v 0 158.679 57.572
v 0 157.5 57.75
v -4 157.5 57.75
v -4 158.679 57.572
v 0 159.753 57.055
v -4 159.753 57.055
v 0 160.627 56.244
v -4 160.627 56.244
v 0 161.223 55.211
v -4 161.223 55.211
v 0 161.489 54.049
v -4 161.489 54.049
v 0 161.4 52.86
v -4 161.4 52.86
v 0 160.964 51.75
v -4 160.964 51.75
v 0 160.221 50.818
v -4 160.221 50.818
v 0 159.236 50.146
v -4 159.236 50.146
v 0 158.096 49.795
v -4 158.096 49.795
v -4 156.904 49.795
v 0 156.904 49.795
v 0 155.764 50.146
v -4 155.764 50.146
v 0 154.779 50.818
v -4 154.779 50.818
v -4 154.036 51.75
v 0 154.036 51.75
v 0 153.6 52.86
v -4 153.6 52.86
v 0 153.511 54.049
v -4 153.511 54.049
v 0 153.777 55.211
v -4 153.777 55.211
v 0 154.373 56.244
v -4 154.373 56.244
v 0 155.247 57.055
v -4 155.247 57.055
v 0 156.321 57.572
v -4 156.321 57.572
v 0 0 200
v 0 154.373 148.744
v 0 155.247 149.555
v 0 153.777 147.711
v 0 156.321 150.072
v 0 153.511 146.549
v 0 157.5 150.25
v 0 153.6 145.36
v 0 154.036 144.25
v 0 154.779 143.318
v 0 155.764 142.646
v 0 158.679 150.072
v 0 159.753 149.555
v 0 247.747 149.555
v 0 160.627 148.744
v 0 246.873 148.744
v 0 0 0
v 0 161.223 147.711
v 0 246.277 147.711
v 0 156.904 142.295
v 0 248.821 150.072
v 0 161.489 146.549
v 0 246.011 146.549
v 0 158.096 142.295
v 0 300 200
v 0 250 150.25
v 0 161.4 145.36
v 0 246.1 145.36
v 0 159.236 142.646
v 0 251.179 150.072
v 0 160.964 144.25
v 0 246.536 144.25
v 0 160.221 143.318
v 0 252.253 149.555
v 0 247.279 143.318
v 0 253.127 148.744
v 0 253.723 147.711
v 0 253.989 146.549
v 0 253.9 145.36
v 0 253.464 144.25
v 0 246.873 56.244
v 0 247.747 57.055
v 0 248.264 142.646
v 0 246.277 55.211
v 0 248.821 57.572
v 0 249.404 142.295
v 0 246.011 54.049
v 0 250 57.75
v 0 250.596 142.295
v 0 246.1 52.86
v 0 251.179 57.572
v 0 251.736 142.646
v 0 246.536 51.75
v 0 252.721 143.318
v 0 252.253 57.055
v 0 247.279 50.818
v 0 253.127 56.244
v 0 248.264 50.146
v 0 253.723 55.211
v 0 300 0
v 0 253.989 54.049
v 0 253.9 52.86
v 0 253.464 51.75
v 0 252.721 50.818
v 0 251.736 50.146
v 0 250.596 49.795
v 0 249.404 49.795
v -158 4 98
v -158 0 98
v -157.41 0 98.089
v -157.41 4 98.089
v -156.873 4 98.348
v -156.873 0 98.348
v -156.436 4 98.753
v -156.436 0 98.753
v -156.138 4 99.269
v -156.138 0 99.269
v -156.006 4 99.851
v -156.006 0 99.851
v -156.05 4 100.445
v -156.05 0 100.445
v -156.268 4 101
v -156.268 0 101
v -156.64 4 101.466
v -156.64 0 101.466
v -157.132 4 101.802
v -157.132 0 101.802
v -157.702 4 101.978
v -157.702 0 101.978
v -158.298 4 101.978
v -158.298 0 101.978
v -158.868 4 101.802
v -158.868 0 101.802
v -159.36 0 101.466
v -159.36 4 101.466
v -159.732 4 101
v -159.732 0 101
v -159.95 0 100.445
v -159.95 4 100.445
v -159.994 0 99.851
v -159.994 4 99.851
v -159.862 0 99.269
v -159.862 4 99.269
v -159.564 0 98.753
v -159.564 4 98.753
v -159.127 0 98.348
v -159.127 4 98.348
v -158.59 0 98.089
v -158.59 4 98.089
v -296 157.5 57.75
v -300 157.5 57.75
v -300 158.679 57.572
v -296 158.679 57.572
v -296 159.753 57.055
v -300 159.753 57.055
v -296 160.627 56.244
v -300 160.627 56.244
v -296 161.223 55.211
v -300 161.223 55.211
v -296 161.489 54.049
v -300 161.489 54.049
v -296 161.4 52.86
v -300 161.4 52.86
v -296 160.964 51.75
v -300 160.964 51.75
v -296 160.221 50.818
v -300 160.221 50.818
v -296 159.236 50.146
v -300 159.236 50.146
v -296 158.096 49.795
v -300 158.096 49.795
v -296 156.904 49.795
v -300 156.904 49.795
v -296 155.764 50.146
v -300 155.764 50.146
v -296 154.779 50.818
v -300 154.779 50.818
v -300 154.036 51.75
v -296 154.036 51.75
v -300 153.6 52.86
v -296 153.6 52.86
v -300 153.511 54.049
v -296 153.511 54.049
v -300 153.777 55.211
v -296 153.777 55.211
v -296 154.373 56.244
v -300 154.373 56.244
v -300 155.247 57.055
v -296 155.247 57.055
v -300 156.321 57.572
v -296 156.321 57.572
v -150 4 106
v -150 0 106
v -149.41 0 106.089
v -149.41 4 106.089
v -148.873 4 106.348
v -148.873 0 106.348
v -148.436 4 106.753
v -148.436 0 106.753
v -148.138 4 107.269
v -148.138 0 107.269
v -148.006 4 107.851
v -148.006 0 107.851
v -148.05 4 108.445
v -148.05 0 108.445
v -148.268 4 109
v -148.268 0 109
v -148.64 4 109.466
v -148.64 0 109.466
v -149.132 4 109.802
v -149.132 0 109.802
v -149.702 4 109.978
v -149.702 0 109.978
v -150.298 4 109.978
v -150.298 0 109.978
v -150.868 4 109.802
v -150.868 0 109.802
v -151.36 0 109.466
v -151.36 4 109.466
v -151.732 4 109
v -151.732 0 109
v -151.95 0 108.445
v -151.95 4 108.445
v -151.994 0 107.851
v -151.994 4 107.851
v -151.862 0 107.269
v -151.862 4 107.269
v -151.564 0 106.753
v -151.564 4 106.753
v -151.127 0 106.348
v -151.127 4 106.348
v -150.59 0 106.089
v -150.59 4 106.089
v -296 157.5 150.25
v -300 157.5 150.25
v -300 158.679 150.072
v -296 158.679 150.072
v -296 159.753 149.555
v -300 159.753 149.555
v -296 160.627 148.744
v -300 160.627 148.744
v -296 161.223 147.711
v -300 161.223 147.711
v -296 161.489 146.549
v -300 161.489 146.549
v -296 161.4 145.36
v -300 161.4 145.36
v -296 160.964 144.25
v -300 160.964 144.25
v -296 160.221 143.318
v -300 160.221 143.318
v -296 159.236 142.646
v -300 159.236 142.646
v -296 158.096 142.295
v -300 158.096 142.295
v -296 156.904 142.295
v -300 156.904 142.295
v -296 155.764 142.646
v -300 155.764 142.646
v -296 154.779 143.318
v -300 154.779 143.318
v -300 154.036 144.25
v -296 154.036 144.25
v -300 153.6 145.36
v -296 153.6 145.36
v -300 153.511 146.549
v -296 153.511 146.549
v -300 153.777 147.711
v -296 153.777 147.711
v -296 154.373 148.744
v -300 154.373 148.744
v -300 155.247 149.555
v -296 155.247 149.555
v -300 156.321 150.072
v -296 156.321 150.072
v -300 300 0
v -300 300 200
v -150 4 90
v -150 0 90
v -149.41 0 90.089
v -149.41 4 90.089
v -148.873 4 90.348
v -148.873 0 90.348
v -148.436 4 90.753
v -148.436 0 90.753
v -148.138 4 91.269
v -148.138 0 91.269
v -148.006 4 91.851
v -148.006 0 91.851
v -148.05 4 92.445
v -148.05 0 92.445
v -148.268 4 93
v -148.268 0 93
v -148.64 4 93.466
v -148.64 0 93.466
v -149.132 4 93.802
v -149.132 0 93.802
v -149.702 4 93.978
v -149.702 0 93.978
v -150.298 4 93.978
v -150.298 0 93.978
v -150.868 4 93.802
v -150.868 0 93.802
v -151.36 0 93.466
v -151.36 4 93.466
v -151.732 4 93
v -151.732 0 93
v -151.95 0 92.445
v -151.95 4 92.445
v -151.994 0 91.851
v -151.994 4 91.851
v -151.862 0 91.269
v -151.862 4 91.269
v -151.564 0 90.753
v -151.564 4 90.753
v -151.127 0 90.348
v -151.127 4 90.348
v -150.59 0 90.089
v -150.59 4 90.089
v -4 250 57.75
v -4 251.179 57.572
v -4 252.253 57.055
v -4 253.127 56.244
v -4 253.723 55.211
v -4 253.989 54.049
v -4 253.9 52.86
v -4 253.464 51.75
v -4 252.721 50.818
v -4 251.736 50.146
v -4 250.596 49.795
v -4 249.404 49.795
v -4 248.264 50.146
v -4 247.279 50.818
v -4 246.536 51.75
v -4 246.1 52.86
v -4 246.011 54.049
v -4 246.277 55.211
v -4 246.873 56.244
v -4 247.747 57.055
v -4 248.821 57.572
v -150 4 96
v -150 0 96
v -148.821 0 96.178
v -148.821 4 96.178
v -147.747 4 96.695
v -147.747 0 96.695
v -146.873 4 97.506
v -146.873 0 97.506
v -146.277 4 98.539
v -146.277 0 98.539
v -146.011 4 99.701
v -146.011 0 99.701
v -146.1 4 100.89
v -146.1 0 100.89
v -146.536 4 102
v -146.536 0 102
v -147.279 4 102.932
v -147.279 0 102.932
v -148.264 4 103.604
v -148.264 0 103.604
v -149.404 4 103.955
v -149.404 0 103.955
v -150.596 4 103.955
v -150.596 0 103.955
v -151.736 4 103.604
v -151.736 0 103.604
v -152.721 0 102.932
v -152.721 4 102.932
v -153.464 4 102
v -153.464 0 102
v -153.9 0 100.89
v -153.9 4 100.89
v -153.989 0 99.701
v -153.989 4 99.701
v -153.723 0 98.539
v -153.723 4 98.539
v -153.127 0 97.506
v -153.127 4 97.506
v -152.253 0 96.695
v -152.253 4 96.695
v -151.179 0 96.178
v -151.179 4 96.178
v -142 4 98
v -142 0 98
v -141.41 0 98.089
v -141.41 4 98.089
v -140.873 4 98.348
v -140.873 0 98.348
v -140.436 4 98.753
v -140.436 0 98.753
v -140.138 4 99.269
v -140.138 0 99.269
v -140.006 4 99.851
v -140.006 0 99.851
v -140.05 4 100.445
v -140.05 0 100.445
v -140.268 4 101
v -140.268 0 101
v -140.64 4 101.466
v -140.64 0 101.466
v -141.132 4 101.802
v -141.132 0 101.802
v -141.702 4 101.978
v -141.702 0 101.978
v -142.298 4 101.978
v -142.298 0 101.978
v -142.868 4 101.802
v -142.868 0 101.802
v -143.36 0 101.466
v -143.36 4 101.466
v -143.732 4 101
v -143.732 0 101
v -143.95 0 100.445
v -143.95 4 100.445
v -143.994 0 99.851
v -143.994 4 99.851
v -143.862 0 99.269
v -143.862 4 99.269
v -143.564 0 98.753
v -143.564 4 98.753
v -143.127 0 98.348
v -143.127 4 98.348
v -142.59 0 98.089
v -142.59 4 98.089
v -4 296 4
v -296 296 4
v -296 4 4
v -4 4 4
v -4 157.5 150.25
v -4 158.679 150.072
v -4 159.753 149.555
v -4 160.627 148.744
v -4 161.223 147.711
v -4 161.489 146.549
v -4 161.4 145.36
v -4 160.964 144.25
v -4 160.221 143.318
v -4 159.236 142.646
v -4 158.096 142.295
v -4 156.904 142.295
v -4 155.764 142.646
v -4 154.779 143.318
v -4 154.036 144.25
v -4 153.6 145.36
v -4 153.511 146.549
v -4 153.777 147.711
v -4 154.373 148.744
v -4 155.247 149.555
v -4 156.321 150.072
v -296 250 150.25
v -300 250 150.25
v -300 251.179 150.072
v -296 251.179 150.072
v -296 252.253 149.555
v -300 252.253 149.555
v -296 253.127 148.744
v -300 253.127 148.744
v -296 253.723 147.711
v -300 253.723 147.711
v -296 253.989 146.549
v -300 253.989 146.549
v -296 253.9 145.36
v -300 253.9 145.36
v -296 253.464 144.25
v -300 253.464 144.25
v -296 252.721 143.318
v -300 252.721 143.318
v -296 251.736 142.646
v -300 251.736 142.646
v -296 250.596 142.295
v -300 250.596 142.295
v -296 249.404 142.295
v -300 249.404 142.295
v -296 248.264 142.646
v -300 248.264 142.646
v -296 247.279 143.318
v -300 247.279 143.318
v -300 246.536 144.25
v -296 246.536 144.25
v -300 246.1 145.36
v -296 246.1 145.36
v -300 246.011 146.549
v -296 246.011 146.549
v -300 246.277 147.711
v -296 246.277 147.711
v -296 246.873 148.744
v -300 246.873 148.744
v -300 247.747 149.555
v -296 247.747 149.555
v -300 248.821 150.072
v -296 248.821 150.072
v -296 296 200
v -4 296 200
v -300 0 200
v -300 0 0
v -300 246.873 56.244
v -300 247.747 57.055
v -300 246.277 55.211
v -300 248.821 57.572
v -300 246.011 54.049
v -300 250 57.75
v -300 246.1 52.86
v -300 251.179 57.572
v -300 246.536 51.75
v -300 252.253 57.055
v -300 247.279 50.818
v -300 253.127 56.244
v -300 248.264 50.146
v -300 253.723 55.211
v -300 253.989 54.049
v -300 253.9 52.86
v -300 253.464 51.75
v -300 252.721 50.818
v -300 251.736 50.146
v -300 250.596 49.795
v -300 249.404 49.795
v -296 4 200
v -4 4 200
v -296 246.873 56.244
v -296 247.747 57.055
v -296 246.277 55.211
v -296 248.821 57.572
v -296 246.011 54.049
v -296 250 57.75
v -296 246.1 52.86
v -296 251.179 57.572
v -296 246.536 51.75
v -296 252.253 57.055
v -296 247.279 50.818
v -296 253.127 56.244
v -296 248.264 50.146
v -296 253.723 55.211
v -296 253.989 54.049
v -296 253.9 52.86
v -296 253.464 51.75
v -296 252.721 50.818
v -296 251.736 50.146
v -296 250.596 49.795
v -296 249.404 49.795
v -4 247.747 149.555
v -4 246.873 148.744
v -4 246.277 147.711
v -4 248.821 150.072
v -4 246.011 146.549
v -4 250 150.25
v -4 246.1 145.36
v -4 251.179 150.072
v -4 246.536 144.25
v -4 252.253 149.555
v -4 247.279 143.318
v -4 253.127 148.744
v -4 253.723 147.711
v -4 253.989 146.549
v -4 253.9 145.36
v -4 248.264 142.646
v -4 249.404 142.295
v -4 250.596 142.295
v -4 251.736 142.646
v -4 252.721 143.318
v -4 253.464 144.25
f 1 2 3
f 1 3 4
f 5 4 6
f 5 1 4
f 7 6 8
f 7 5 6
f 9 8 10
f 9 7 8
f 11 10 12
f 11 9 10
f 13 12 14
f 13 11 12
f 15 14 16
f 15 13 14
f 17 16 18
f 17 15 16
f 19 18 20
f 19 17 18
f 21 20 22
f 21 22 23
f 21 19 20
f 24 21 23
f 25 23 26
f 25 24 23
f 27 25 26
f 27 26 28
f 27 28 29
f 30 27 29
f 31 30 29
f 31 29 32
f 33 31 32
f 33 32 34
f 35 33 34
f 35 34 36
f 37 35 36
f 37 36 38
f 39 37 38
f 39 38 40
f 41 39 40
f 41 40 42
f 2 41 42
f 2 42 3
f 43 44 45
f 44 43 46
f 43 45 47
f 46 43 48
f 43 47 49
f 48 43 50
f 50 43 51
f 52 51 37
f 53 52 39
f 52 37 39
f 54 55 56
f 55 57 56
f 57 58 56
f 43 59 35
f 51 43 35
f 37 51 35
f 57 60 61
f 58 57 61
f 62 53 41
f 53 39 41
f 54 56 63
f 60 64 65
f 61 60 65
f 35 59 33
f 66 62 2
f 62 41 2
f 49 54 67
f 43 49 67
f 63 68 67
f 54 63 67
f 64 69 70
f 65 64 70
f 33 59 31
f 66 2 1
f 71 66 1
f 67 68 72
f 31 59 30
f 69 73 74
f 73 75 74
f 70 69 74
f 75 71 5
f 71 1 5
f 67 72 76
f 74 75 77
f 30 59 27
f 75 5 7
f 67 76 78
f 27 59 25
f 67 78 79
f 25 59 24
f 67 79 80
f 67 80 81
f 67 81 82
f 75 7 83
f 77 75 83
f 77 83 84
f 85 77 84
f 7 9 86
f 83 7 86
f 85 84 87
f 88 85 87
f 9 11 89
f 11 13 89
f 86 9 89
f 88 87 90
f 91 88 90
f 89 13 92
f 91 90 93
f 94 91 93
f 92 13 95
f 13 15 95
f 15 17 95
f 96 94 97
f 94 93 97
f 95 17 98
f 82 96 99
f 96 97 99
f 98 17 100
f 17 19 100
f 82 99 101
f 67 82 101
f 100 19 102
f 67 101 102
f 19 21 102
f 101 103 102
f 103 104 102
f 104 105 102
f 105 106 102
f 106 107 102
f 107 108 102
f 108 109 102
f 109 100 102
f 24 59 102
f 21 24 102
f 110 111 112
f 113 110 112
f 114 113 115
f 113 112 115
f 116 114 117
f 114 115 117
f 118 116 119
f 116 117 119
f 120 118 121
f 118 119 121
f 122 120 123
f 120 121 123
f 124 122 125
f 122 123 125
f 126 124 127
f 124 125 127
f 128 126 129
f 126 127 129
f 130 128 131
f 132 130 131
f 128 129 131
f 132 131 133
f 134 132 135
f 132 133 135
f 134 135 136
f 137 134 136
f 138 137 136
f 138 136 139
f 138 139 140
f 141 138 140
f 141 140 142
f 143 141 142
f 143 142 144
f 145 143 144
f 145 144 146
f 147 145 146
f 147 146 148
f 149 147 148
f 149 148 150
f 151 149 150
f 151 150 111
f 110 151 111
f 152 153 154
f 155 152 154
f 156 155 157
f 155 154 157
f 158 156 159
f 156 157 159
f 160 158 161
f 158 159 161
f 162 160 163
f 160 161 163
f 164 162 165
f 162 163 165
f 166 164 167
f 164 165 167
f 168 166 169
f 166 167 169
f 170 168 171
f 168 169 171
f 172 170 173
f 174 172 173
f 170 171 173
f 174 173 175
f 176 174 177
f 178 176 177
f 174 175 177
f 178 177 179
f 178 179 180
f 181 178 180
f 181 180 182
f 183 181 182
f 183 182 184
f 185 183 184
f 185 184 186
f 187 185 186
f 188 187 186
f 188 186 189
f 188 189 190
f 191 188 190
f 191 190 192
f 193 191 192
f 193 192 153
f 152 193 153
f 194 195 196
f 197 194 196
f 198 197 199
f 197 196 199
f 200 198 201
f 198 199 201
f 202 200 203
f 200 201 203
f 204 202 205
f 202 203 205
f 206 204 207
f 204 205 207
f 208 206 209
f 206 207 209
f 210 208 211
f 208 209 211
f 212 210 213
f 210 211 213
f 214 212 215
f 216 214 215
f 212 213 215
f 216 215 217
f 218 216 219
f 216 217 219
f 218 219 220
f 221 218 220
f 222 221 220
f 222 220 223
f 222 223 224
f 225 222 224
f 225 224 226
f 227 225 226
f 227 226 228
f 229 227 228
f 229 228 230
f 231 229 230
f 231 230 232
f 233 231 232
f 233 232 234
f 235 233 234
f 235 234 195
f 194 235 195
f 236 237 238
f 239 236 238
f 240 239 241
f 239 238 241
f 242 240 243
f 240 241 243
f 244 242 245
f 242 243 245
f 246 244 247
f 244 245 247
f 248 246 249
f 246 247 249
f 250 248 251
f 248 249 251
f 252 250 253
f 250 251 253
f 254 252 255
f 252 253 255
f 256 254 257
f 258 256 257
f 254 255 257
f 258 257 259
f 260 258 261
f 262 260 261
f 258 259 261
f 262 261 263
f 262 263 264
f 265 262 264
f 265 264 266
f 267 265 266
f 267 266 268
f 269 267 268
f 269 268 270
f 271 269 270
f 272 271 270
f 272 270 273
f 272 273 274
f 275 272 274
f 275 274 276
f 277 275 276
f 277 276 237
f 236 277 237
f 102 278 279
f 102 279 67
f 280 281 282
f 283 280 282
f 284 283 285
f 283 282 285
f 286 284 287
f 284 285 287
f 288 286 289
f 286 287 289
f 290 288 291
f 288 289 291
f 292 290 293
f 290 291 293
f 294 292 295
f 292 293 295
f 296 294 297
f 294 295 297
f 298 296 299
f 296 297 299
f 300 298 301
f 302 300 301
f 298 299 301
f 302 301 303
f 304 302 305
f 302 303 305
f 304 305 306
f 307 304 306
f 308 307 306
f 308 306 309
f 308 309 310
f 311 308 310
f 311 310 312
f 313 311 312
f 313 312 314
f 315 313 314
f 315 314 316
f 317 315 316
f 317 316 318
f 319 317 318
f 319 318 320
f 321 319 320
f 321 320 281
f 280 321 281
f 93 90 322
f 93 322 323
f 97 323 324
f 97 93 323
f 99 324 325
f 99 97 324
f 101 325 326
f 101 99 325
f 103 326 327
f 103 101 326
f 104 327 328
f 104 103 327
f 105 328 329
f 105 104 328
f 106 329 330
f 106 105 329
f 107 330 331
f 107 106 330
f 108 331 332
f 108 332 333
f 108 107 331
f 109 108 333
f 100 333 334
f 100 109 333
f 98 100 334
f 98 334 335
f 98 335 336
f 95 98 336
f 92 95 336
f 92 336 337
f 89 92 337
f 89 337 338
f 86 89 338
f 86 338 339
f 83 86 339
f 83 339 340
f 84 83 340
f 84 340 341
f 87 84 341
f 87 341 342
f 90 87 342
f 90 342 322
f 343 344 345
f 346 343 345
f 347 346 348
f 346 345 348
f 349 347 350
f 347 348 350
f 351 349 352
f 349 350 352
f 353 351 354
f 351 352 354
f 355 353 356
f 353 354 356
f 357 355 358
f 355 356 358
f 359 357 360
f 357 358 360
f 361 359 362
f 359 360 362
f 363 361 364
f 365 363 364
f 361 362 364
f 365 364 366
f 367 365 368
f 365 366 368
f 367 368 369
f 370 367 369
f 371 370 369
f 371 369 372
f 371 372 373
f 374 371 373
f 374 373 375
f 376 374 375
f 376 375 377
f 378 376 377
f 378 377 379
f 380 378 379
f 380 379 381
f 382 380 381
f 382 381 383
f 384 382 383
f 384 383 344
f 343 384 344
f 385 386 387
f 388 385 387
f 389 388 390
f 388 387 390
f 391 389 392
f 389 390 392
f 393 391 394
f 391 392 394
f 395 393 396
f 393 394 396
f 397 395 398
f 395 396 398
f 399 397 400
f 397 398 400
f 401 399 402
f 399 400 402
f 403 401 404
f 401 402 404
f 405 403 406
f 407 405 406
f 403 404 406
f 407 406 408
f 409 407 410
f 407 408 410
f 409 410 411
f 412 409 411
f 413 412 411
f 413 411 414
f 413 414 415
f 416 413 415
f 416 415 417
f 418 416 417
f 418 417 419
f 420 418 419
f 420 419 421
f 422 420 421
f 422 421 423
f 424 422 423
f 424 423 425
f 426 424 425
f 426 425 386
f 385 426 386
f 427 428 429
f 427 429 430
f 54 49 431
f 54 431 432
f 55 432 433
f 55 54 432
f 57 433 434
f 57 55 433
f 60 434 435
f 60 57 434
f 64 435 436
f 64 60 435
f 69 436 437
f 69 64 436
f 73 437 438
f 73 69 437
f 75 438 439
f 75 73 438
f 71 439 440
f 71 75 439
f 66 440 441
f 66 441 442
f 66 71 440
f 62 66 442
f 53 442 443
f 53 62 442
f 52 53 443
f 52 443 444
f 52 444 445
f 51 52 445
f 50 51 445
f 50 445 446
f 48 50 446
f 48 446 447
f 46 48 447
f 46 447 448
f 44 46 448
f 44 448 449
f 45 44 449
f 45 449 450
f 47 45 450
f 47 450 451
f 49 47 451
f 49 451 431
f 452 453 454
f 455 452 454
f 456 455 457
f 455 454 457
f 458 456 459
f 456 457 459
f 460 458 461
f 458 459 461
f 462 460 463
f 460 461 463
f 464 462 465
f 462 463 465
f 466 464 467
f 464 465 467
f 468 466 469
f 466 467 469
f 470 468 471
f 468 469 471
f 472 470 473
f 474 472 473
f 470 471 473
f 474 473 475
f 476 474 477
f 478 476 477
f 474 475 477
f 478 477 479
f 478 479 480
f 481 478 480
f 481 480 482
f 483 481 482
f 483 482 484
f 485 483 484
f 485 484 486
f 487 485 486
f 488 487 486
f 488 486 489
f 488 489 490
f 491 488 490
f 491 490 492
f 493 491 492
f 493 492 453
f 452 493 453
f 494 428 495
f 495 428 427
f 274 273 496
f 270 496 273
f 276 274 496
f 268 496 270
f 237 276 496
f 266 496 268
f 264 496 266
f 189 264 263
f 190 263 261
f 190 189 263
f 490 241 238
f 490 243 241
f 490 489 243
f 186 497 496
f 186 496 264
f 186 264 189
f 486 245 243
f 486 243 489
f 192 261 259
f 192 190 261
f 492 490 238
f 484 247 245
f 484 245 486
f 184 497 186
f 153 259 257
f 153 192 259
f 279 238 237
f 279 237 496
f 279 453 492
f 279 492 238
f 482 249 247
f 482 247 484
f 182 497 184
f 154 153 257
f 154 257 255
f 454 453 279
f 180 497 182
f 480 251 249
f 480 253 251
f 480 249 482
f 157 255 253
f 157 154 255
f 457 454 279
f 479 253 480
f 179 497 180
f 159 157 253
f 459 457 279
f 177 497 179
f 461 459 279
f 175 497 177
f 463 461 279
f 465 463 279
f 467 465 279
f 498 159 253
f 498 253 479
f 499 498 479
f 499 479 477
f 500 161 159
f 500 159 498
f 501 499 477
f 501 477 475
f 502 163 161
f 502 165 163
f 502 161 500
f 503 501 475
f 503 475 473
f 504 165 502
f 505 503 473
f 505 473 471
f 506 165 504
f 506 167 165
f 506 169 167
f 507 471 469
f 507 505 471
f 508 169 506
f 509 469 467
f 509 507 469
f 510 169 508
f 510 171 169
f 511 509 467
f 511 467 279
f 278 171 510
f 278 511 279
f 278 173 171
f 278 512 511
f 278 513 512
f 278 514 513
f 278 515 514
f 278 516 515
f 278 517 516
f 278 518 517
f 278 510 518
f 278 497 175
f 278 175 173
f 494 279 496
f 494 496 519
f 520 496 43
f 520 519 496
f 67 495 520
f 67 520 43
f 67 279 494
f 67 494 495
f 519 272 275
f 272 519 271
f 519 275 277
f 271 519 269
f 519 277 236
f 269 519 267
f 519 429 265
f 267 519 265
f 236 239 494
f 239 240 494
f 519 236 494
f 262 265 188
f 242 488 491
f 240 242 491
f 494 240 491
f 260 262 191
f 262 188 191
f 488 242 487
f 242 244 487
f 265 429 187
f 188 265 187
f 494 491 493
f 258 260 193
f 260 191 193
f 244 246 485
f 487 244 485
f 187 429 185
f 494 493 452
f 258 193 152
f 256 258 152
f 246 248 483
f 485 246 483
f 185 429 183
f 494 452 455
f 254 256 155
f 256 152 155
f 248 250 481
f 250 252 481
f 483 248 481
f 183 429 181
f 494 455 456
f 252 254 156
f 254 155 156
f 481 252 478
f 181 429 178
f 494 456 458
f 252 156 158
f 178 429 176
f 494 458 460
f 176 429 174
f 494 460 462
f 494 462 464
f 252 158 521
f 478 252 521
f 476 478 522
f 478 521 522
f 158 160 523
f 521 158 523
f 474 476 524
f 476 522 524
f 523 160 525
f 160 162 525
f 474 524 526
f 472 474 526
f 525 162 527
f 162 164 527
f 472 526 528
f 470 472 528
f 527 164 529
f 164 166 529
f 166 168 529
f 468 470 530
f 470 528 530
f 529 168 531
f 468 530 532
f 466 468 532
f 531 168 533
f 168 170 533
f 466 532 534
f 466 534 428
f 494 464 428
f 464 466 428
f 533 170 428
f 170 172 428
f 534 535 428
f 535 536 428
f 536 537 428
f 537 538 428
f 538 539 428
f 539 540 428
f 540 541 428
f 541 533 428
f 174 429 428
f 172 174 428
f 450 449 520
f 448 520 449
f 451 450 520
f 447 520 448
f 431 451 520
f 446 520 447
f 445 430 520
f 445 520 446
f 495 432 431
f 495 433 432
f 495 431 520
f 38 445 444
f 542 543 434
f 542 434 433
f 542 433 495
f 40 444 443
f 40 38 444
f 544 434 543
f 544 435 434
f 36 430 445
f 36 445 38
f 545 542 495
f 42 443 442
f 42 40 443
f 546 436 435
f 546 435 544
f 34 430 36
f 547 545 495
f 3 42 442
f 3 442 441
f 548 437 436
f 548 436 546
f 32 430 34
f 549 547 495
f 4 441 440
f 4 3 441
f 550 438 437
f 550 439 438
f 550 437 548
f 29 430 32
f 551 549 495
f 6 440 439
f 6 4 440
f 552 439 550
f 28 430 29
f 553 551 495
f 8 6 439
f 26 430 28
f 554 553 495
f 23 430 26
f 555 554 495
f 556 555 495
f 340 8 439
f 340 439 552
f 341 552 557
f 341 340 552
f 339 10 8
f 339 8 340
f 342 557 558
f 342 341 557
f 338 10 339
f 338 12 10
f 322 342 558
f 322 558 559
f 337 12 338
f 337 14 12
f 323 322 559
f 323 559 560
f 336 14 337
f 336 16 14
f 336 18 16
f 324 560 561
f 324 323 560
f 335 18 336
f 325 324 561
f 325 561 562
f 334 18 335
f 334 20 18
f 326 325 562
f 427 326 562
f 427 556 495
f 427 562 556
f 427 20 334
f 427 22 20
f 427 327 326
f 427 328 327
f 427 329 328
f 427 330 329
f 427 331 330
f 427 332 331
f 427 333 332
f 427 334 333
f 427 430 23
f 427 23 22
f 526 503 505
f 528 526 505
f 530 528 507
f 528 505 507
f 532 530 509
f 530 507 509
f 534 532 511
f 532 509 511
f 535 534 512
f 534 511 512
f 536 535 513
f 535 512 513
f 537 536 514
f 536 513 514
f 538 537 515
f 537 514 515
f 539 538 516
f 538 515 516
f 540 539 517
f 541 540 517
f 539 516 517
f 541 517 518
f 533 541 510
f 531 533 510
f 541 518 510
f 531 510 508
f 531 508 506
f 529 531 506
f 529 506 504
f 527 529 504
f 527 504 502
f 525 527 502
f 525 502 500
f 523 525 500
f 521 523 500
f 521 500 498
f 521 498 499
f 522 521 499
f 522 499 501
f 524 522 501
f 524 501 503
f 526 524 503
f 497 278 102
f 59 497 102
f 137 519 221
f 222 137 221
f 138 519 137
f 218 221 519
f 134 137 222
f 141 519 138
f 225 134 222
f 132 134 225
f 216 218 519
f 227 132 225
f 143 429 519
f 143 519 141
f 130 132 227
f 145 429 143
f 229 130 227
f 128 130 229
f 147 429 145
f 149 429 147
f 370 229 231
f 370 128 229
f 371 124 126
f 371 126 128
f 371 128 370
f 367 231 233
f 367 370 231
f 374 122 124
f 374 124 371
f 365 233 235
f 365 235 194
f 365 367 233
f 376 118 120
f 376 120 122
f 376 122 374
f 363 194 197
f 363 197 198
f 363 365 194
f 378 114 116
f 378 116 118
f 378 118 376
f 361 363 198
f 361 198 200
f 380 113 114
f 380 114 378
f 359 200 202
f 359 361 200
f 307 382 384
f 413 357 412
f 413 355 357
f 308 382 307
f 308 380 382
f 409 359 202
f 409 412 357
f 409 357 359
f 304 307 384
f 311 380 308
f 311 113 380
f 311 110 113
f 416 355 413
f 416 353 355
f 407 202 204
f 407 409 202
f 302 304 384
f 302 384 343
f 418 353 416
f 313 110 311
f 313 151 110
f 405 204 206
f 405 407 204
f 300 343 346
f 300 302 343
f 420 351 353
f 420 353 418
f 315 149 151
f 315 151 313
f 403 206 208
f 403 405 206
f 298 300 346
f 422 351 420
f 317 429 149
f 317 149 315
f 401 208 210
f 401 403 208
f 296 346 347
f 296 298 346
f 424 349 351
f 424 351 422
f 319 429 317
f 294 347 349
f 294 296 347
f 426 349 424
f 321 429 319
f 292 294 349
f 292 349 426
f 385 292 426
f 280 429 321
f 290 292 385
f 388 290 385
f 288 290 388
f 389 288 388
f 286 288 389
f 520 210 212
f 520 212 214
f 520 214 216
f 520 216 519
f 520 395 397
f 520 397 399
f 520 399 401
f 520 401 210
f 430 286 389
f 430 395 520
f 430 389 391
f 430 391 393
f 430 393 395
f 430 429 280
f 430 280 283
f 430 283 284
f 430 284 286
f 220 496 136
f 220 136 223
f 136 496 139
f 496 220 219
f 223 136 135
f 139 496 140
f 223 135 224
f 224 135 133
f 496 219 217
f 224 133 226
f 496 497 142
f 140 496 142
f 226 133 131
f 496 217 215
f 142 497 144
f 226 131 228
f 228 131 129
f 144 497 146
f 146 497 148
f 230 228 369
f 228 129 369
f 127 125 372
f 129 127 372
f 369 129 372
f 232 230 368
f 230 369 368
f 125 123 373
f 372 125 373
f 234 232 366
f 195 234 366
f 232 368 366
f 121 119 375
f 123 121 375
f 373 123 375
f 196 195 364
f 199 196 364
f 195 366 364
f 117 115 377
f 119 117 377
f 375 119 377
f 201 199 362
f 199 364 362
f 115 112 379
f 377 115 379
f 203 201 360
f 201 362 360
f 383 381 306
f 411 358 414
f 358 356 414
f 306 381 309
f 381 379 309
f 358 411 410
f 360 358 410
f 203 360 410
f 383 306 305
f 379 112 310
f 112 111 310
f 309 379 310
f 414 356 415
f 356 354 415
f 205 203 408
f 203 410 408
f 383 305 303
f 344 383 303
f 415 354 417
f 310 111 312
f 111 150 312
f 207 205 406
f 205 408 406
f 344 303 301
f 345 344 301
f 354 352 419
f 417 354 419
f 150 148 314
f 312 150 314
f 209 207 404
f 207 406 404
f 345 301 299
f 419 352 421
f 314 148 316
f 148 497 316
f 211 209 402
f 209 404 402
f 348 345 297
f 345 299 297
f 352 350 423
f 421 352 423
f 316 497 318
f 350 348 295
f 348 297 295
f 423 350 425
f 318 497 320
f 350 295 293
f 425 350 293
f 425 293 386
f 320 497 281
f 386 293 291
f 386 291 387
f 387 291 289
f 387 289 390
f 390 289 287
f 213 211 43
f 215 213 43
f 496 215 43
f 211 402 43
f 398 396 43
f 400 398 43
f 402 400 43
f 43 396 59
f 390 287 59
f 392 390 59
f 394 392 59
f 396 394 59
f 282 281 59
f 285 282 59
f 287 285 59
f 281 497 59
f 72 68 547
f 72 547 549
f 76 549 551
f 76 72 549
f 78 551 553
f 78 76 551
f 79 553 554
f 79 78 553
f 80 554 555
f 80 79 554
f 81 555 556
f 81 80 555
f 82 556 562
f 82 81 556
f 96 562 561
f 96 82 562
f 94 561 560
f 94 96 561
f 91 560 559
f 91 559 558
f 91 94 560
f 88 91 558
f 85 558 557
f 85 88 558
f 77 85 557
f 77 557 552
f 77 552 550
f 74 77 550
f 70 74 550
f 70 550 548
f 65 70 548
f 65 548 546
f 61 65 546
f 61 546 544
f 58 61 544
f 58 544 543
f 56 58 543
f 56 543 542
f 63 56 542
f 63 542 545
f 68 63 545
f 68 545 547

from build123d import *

# Parameters (mm, degrees)
IZIM1_W                     = 300
IZIM1_H                     = 300
Y_KSEKLIK_EKSTR_ZYON1_DEPTH = 200
BO_ALTMA1_T                 = -4
KES_EKSTR_ZYON1_REACH       = 471.042
IZIM2_R                     = 4
KES_EKSTR_ZYON2_REACH       = 471.042
IZIM3_R                     = 4
IZIM3_R_2                   = 2


with BuildPart() as part:
    # Çizim1 → Yükseklik-Ekstrüzyon1 (new body)
    with BuildSketch(Plane.XY):
        with Locations((-150, 150)):
            Rectangle(IZIM1_W, IZIM1_H)
    extrude(amount=Y_KSEKLIK_EKSTR_ZYON1_DEPTH)

    # İç Boşaltma1
    bo_altma1_openings = [part.faces().sort_by_distance(p)[0] for p in [
        (-150, 150, 200),
    ]]
    offset(amount=BO_ALTMA1_T, openings=bo_altma1_openings, kind=Kind.INTERSECTION)

    # Çizim2 → Kes-Ekstrüzyon1 (cut, up to next)
    with BuildSketch(Plane.ZY.offset(300), mode=Mode.PRIVATE) as kes_ekstr_zyon1_sk1:
        with Locations((146.25, 250)):
            Circle(IZIM2_R)
    kes_ekstr_zyon1_tool1 = extrude(kes_ekstr_zyon1_sk1.sketch, amount=-KES_EKSTR_ZYON1_REACH, mode=Mode.PRIVATE) & part.part
    # Çizim2 → Kes-Ekstrüzyon1 (cut, up to next)
    with BuildSketch(Plane.ZY.offset(300), mode=Mode.PRIVATE) as kes_ekstr_zyon1_sk2:
        with Locations((53.75, 250)):
            Circle(IZIM2_R)
    kes_ekstr_zyon1_tool2 = extrude(kes_ekstr_zyon1_sk2.sketch, amount=-KES_EKSTR_ZYON1_REACH, mode=Mode.PRIVATE) & part.part
    # Çizim2 → Kes-Ekstrüzyon1 (cut, up to next)
    with BuildSketch(Plane.ZY.offset(300), mode=Mode.PRIVATE) as kes_ekstr_zyon1_sk3:
        with Locations((146.25, 157.5)):
            Circle(IZIM2_R)
    kes_ekstr_zyon1_tool3 = extrude(kes_ekstr_zyon1_sk3.sketch, amount=-KES_EKSTR_ZYON1_REACH, mode=Mode.PRIVATE) & part.part
    # Çizim2 → Kes-Ekstrüzyon1 (cut, up to next)
    with BuildSketch(Plane.ZY.offset(300), mode=Mode.PRIVATE) as kes_ekstr_zyon1_sk4:
        with Locations((53.75, 157.5)):
            Circle(IZIM2_R)
    kes_ekstr_zyon1_tool4 = extrude(kes_ekstr_zyon1_sk4.sketch, amount=-KES_EKSTR_ZYON1_REACH, mode=Mode.PRIVATE) & part.part
    kes_ekstr_zyon1_1 = kes_ekstr_zyon1_tool1.solids().sort_by_distance((-300, 250, 146.25))[0]
    add(kes_ekstr_zyon1_1, mode=Mode.SUBTRACT)
    kes_ekstr_zyon1_2 = kes_ekstr_zyon1_tool2.solids().sort_by_distance((-300, 250, 53.75))[0]
    add(kes_ekstr_zyon1_2, mode=Mode.SUBTRACT)
    kes_ekstr_zyon1_3 = kes_ekstr_zyon1_tool3.solids().sort_by_distance((-300, 157.5, 146.25))[0]
    add(kes_ekstr_zyon1_3, mode=Mode.SUBTRACT)
    kes_ekstr_zyon1_4 = kes_ekstr_zyon1_tool4.solids().sort_by_distance((-300, 157.5, 53.75))[0]
    add(kes_ekstr_zyon1_4, mode=Mode.SUBTRACT)
    kes_ekstr_zyon1 = kes_ekstr_zyon1_1 + kes_ekstr_zyon1_2 + kes_ekstr_zyon1_3 + kes_ekstr_zyon1_4  # Kes-Ekstrüzyon1 as one shape, for the pattern or mirror that repeats it

    # Aynalama1: Kes-Ekstrüzyon1 across plane
    add(kes_ekstr_zyon1.mirror(Plane(origin=(-150, 0, 0), x_dir=(0, 0, 1), z_dir=(1, 0, 0))), mode=Mode.SUBTRACT)

    # Çizim3 → Kes-Ekstrüzyon2 (cut, up to next)
    with BuildSketch(Plane.XZ, mode=Mode.PRIVATE) as kes_ekstr_zyon2_sk1:
        with Locations(Location((-150, 100, 0), (0, 0, 270))):
            Circle(IZIM3_R)
    kes_ekstr_zyon2_tool1 = extrude(kes_ekstr_zyon2_sk1.sketch, amount=-KES_EKSTR_ZYON2_REACH, mode=Mode.PRIVATE) & part.part
    # Çizim3 → Kes-Ekstrüzyon2 (cut, up to next)
    with BuildSketch(Plane.XZ, mode=Mode.PRIVATE) as kes_ekstr_zyon2_sk2:
        with Locations(Location((-150, 108, 0), (0, 0, 270))):
            Circle(IZIM3_R_2)
    kes_ekstr_zyon2_tool2 = extrude(kes_ekstr_zyon2_sk2.sketch, amount=-KES_EKSTR_ZYON2_REACH, mode=Mode.PRIVATE) & part.part
    # Çizim3 → Kes-Ekstrüzyon2 (cut, up to next)
    with BuildSketch(Plane.XZ, mode=Mode.PRIVATE) as kes_ekstr_zyon2_sk3:
        with Locations(Location((-158, 100, 0), (0, 0, 270))):
            Circle(IZIM3_R_2)
    kes_ekstr_zyon2_tool3 = extrude(kes_ekstr_zyon2_sk3.sketch, amount=-KES_EKSTR_ZYON2_REACH, mode=Mode.PRIVATE) & part.part
    # Çizim3 → Kes-Ekstrüzyon2 (cut, up to next)
    with BuildSketch(Plane.XZ, mode=Mode.PRIVATE) as kes_ekstr_zyon2_sk4:
        with Locations(Location((-150, 92, 0), (0, 0, 270))):
            Circle(IZIM3_R_2)
    kes_ekstr_zyon2_tool4 = extrude(kes_ekstr_zyon2_sk4.sketch, amount=-KES_EKSTR_ZYON2_REACH, mode=Mode.PRIVATE) & part.part
    # Çizim3 → Kes-Ekstrüzyon2 (cut, up to next)
    with BuildSketch(Plane.XZ, mode=Mode.PRIVATE) as kes_ekstr_zyon2_sk5:
        with Locations(Location((-142, 100, 0), (0, 0, 270))):
            Circle(IZIM3_R_2)
    kes_ekstr_zyon2_tool5 = extrude(kes_ekstr_zyon2_sk5.sketch, amount=-KES_EKSTR_ZYON2_REACH, mode=Mode.PRIVATE) & part.part
    add(kes_ekstr_zyon2_tool1.solids().sort_by_distance((-150, 0, 100))[0], mode=Mode.SUBTRACT)
    add(kes_ekstr_zyon2_tool2.solids().sort_by_distance((-150, 0, 108))[0], mode=Mode.SUBTRACT)
    add(kes_ekstr_zyon2_tool3.solids().sort_by_distance((-158, 0, 100))[0], mode=Mode.SUBTRACT)
    add(kes_ekstr_zyon2_tool4.solids().sort_by_distance((-150, 0, 92))[0], mode=Mode.SUBTRACT)
    add(kes_ekstr_zyon2_tool5.solids().sort_by_distance((-142, 0, 100))[0], mode=Mode.SUBTRACT)


solid = part.part
